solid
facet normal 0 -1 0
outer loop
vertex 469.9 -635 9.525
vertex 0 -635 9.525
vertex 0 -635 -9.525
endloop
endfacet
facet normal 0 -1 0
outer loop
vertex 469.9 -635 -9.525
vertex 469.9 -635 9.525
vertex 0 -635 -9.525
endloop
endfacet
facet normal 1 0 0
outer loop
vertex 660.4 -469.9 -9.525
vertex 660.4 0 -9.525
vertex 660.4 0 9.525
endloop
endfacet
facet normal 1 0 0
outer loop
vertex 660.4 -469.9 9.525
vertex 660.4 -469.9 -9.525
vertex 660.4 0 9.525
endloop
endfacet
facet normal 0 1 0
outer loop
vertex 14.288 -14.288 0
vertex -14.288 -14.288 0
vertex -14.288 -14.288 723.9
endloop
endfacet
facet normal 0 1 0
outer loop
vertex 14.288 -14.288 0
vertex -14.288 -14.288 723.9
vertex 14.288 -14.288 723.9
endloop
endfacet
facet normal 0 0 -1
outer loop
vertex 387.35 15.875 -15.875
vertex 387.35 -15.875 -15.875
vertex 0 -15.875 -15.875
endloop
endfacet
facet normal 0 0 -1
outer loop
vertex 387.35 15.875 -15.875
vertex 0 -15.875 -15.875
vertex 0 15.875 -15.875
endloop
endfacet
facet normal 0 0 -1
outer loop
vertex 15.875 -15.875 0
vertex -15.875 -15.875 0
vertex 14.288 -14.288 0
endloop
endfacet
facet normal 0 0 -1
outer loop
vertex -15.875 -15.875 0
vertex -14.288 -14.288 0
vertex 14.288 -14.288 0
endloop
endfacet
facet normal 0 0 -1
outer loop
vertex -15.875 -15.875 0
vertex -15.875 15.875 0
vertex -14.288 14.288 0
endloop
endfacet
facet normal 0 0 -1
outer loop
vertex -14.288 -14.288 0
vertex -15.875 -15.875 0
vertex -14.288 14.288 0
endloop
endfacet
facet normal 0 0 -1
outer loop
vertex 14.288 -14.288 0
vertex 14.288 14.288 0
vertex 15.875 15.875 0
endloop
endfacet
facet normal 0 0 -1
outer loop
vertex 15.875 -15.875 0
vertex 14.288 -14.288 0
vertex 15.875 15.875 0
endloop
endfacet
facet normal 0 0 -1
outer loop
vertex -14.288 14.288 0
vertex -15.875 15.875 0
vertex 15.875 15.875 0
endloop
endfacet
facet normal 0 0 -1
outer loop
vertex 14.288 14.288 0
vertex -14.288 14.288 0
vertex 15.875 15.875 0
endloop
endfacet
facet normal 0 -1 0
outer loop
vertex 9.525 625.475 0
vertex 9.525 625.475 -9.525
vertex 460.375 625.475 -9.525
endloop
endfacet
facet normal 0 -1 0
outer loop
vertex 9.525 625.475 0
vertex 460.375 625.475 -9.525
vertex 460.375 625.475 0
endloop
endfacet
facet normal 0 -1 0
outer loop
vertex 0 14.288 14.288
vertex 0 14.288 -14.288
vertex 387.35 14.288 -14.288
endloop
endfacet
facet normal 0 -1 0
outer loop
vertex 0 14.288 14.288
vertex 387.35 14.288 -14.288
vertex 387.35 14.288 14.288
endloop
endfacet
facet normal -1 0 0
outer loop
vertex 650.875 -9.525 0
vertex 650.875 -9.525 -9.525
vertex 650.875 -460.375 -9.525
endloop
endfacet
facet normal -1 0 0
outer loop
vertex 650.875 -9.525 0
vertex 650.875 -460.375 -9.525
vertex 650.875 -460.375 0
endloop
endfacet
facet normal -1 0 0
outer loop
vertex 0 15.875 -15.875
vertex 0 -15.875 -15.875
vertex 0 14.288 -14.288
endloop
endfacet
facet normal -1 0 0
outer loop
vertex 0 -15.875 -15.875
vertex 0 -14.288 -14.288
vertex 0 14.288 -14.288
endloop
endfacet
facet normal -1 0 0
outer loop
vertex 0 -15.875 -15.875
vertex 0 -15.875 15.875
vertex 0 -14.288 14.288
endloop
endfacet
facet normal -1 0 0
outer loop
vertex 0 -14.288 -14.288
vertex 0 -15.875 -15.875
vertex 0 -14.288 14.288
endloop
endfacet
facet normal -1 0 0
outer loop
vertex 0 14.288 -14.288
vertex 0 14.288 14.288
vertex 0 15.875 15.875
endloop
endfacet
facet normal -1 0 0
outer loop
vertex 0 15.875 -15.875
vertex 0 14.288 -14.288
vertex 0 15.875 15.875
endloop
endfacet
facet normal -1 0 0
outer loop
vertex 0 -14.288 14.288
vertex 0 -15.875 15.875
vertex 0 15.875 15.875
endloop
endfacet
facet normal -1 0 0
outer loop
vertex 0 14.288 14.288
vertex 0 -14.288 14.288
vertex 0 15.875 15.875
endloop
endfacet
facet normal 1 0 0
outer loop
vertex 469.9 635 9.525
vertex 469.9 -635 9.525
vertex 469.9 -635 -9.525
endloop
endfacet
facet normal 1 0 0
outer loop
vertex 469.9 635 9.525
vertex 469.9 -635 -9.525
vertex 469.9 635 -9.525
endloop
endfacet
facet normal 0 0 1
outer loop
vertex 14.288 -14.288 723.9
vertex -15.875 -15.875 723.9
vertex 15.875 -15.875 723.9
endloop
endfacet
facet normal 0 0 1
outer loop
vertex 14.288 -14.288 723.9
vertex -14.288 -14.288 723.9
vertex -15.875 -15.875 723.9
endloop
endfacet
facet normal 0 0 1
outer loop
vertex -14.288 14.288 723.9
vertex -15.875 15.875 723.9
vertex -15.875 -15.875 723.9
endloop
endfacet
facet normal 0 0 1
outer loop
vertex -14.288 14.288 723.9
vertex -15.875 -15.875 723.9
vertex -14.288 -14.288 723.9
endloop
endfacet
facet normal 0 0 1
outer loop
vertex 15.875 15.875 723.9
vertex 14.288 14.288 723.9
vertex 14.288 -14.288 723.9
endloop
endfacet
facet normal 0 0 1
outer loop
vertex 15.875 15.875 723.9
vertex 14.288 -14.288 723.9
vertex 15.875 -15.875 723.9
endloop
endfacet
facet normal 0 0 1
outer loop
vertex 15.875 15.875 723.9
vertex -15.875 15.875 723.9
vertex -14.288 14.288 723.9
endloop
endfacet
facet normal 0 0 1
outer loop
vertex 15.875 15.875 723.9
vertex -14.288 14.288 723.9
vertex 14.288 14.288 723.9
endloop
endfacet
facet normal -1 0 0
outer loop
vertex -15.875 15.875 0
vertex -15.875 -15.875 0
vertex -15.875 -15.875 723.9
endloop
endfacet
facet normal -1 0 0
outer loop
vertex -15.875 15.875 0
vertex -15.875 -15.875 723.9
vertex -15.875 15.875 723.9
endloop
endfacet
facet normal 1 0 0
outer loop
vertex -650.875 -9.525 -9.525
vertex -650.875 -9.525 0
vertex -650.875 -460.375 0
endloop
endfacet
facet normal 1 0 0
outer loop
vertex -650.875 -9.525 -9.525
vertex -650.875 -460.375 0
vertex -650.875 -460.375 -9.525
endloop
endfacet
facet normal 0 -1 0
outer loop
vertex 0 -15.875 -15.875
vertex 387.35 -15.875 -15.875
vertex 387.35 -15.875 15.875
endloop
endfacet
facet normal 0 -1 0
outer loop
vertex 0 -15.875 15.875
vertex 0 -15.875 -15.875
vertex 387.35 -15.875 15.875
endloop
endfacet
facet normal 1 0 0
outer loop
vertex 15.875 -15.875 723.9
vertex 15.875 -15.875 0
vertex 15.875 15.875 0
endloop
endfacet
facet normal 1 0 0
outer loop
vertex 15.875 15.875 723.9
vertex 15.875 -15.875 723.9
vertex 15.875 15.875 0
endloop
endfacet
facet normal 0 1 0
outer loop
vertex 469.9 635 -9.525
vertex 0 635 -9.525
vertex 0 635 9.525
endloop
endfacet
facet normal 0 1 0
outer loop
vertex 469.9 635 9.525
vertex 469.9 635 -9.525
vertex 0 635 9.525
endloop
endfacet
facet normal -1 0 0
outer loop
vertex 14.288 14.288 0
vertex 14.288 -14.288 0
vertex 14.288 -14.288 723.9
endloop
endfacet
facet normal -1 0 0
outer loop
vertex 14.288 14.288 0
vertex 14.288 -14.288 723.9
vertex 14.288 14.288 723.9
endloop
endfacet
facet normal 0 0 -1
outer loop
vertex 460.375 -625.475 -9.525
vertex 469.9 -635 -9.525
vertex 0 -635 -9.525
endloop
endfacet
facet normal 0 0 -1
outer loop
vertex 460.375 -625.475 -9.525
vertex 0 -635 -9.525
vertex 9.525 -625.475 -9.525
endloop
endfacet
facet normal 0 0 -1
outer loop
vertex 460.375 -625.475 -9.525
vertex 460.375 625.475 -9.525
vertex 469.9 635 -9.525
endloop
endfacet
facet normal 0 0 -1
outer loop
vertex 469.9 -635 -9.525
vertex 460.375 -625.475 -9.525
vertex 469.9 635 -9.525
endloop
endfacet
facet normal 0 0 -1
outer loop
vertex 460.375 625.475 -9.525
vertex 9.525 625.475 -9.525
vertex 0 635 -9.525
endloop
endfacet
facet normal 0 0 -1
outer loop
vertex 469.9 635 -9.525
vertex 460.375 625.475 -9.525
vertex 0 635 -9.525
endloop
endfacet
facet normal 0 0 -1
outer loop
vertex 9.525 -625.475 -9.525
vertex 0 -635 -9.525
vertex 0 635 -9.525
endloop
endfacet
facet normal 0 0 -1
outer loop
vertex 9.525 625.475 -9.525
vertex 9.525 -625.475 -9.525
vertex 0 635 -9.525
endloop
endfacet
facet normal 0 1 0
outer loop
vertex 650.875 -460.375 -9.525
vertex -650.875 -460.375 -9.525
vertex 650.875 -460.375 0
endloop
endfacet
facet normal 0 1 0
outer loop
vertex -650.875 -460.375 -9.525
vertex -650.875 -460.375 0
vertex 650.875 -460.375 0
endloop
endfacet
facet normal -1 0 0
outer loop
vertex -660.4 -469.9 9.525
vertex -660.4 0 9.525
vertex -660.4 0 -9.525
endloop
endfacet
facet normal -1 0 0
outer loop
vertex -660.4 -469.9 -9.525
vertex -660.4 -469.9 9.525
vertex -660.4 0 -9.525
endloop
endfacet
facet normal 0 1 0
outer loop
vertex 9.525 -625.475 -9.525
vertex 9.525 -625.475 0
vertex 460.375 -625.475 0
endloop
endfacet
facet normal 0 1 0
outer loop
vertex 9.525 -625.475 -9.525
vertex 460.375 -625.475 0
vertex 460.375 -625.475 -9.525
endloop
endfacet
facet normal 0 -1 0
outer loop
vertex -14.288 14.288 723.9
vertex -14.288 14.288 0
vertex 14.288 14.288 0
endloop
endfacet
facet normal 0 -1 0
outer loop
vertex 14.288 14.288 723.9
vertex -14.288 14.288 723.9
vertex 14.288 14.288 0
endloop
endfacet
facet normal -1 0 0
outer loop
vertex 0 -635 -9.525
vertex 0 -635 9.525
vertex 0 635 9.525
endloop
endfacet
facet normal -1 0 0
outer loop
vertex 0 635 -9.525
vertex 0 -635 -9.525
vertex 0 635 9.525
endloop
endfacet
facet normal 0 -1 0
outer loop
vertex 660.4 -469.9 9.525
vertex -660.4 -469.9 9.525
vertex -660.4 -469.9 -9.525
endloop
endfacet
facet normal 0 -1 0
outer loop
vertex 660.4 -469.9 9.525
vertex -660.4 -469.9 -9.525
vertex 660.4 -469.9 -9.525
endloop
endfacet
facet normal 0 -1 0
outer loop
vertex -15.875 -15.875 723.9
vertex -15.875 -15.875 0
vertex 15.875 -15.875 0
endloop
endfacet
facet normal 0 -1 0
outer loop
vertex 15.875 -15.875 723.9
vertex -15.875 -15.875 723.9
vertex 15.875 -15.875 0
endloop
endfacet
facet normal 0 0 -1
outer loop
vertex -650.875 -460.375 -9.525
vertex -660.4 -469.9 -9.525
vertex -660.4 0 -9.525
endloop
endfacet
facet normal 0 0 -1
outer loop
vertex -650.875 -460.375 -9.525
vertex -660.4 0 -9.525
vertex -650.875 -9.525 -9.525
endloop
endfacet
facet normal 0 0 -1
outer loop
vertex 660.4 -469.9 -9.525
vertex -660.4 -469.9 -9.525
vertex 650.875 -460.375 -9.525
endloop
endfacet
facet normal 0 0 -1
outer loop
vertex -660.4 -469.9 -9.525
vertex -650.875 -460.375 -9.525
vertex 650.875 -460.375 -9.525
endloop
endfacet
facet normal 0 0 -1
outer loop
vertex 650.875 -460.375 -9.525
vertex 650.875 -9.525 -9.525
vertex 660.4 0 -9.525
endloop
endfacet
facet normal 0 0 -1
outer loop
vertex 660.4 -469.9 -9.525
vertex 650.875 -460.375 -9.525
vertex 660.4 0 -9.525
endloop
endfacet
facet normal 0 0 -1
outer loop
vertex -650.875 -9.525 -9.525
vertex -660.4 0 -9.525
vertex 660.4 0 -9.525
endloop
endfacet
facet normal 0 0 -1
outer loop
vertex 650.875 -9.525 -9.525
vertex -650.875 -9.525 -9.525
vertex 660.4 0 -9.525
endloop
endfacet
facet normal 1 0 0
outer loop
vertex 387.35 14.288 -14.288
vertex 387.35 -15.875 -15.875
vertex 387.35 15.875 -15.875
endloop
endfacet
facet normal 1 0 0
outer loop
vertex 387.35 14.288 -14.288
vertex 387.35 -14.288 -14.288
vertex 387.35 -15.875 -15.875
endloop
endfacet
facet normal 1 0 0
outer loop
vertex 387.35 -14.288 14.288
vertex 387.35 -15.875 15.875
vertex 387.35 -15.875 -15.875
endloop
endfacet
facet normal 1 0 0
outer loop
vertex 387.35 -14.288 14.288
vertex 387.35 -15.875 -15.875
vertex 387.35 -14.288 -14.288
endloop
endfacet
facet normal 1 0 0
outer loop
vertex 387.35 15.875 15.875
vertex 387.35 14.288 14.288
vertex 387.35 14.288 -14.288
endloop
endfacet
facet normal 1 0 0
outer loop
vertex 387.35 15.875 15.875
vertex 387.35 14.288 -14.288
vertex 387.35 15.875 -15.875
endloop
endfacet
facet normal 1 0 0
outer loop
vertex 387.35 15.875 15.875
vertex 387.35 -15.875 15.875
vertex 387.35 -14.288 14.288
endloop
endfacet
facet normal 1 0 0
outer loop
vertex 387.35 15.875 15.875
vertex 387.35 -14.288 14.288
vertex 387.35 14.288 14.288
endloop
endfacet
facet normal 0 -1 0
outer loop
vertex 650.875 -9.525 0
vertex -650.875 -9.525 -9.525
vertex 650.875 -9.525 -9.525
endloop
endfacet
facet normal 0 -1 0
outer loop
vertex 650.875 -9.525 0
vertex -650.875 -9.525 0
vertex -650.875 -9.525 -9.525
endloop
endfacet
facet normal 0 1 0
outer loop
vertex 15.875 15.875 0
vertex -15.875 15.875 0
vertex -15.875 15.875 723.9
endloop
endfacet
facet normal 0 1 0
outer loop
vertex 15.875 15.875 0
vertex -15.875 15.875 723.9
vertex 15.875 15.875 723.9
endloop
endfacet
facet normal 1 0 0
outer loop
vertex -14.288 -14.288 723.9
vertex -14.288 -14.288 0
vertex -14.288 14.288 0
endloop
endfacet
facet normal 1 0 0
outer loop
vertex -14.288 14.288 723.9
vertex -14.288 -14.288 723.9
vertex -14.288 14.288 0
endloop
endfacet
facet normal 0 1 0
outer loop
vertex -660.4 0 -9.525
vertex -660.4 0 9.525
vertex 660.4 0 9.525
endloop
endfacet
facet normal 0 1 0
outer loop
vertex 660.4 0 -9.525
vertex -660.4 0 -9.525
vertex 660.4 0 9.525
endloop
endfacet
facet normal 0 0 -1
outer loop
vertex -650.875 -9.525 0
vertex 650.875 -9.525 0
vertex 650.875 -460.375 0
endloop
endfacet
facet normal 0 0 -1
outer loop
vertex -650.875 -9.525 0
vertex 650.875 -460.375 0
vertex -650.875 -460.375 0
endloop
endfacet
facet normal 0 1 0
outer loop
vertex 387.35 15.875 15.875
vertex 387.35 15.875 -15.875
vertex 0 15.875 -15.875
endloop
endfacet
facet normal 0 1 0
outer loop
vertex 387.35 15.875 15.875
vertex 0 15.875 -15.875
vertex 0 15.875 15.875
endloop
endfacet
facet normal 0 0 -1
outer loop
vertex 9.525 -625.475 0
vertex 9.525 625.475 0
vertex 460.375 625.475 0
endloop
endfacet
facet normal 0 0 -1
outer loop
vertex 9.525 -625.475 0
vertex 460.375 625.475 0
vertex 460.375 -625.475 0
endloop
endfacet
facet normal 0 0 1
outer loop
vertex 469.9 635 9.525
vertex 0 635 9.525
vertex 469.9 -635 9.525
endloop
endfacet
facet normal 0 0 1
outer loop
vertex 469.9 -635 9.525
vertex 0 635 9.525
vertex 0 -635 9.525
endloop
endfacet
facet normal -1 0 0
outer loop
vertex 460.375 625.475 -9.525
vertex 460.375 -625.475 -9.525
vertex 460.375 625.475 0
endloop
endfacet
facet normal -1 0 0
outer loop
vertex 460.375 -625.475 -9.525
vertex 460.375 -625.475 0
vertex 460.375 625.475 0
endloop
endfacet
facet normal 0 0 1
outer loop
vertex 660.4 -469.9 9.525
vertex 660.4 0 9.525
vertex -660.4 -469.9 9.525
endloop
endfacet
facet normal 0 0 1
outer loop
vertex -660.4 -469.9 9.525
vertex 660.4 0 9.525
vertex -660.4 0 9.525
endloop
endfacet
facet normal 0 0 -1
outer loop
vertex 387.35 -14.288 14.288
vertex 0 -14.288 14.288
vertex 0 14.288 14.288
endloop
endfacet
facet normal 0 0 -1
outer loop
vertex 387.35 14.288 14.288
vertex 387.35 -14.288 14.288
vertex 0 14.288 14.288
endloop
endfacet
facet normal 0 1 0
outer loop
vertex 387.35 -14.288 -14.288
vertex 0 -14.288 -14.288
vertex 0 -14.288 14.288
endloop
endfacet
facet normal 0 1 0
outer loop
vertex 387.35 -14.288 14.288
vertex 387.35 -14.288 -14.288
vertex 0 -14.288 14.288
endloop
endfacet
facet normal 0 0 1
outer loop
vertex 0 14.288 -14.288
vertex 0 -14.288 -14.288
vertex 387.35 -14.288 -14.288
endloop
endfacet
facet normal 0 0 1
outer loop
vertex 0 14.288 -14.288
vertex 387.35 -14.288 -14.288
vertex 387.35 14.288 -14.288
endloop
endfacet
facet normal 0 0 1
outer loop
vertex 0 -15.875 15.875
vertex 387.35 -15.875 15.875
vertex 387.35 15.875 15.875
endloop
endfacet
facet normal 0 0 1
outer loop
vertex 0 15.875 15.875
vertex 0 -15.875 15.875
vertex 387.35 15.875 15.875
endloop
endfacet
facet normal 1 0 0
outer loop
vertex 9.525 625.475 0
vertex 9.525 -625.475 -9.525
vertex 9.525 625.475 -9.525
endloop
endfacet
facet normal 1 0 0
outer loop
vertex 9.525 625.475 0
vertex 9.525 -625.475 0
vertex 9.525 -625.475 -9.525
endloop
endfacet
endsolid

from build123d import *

# Parameters (mm, degrees)
F1_DEPTH = 469.9
F2_W     = 469.9
F2_H     = 9.525
F3_DEPTH = 469.9
F4_T     = -9.525
F5_T     = -9.525
F6_W     = 31.75
F6_H     = 31.75
F6_W_2   = 28.575
F6_H_2   = 28.575
F7_DEPTH = 723.9
F8_W     = 31.75
F8_H     = 31.75
F8_W_2   = 28.575
F8_H_2   = 28.575
F9_DEPTH = 387.35


with BuildPart() as f1:
    # F0 (on Front) → F1 (new body)
    with BuildSketch(Plane.XZ):
        Polygon((660.4, 0), (660.4, 9.525), (-660.4, 9.525), (-660.4, -9.525), (650.875, -9.525), (660.4, -9.525), align=None)
    extrude(amount=F1_DEPTH)

    # F4
    f4_openings = [f1.faces().sort_by_distance(p)[0] for p in [
        (0, -234.95, -9.525),
    ]]
    offset(amount=F4_T, openings=f4_openings)


with BuildPart() as f3:
    # F2 (on Right) → F3 (new body)
    with BuildSketch(Plane.YZ):
        Polygon((635, -9.525), (635, 9.525), (-165.1, 9.525), (-165.1, 0), (-635, 0), (-635, -9.525), align=None)
        with Locations((-400.05, 4.7625)):
            Rectangle(F2_W, F2_H)
    extrude(amount=F3_DEPTH)

    # F5
    f5_openings = [f3.faces().sort_by_distance(p)[0] for p in [
        (234.95, 0, -9.525),
    ]]
    offset(amount=F5_T, openings=f5_openings)


with BuildPart() as f7:
    # F6 (on Top) → F7 (new body)
    with BuildSketch(Plane.XY):
        Rectangle(F6_W, F6_H)
        Rectangle(F6_W_2, F6_H_2, mode=Mode.SUBTRACT)
    extrude(amount=F7_DEPTH)


with BuildPart() as f9:
    # F8 (on Right) → F9 (new body)
    with BuildSketch(Plane.YZ):
        Rectangle(F8_W, F8_H)
        Rectangle(F8_W_2, F8_H_2, mode=Mode.SUBTRACT)
    extrude(amount=F9_DEPTH)


solid = Compound([f1.part, f3.part, f7.part, f9.part])
